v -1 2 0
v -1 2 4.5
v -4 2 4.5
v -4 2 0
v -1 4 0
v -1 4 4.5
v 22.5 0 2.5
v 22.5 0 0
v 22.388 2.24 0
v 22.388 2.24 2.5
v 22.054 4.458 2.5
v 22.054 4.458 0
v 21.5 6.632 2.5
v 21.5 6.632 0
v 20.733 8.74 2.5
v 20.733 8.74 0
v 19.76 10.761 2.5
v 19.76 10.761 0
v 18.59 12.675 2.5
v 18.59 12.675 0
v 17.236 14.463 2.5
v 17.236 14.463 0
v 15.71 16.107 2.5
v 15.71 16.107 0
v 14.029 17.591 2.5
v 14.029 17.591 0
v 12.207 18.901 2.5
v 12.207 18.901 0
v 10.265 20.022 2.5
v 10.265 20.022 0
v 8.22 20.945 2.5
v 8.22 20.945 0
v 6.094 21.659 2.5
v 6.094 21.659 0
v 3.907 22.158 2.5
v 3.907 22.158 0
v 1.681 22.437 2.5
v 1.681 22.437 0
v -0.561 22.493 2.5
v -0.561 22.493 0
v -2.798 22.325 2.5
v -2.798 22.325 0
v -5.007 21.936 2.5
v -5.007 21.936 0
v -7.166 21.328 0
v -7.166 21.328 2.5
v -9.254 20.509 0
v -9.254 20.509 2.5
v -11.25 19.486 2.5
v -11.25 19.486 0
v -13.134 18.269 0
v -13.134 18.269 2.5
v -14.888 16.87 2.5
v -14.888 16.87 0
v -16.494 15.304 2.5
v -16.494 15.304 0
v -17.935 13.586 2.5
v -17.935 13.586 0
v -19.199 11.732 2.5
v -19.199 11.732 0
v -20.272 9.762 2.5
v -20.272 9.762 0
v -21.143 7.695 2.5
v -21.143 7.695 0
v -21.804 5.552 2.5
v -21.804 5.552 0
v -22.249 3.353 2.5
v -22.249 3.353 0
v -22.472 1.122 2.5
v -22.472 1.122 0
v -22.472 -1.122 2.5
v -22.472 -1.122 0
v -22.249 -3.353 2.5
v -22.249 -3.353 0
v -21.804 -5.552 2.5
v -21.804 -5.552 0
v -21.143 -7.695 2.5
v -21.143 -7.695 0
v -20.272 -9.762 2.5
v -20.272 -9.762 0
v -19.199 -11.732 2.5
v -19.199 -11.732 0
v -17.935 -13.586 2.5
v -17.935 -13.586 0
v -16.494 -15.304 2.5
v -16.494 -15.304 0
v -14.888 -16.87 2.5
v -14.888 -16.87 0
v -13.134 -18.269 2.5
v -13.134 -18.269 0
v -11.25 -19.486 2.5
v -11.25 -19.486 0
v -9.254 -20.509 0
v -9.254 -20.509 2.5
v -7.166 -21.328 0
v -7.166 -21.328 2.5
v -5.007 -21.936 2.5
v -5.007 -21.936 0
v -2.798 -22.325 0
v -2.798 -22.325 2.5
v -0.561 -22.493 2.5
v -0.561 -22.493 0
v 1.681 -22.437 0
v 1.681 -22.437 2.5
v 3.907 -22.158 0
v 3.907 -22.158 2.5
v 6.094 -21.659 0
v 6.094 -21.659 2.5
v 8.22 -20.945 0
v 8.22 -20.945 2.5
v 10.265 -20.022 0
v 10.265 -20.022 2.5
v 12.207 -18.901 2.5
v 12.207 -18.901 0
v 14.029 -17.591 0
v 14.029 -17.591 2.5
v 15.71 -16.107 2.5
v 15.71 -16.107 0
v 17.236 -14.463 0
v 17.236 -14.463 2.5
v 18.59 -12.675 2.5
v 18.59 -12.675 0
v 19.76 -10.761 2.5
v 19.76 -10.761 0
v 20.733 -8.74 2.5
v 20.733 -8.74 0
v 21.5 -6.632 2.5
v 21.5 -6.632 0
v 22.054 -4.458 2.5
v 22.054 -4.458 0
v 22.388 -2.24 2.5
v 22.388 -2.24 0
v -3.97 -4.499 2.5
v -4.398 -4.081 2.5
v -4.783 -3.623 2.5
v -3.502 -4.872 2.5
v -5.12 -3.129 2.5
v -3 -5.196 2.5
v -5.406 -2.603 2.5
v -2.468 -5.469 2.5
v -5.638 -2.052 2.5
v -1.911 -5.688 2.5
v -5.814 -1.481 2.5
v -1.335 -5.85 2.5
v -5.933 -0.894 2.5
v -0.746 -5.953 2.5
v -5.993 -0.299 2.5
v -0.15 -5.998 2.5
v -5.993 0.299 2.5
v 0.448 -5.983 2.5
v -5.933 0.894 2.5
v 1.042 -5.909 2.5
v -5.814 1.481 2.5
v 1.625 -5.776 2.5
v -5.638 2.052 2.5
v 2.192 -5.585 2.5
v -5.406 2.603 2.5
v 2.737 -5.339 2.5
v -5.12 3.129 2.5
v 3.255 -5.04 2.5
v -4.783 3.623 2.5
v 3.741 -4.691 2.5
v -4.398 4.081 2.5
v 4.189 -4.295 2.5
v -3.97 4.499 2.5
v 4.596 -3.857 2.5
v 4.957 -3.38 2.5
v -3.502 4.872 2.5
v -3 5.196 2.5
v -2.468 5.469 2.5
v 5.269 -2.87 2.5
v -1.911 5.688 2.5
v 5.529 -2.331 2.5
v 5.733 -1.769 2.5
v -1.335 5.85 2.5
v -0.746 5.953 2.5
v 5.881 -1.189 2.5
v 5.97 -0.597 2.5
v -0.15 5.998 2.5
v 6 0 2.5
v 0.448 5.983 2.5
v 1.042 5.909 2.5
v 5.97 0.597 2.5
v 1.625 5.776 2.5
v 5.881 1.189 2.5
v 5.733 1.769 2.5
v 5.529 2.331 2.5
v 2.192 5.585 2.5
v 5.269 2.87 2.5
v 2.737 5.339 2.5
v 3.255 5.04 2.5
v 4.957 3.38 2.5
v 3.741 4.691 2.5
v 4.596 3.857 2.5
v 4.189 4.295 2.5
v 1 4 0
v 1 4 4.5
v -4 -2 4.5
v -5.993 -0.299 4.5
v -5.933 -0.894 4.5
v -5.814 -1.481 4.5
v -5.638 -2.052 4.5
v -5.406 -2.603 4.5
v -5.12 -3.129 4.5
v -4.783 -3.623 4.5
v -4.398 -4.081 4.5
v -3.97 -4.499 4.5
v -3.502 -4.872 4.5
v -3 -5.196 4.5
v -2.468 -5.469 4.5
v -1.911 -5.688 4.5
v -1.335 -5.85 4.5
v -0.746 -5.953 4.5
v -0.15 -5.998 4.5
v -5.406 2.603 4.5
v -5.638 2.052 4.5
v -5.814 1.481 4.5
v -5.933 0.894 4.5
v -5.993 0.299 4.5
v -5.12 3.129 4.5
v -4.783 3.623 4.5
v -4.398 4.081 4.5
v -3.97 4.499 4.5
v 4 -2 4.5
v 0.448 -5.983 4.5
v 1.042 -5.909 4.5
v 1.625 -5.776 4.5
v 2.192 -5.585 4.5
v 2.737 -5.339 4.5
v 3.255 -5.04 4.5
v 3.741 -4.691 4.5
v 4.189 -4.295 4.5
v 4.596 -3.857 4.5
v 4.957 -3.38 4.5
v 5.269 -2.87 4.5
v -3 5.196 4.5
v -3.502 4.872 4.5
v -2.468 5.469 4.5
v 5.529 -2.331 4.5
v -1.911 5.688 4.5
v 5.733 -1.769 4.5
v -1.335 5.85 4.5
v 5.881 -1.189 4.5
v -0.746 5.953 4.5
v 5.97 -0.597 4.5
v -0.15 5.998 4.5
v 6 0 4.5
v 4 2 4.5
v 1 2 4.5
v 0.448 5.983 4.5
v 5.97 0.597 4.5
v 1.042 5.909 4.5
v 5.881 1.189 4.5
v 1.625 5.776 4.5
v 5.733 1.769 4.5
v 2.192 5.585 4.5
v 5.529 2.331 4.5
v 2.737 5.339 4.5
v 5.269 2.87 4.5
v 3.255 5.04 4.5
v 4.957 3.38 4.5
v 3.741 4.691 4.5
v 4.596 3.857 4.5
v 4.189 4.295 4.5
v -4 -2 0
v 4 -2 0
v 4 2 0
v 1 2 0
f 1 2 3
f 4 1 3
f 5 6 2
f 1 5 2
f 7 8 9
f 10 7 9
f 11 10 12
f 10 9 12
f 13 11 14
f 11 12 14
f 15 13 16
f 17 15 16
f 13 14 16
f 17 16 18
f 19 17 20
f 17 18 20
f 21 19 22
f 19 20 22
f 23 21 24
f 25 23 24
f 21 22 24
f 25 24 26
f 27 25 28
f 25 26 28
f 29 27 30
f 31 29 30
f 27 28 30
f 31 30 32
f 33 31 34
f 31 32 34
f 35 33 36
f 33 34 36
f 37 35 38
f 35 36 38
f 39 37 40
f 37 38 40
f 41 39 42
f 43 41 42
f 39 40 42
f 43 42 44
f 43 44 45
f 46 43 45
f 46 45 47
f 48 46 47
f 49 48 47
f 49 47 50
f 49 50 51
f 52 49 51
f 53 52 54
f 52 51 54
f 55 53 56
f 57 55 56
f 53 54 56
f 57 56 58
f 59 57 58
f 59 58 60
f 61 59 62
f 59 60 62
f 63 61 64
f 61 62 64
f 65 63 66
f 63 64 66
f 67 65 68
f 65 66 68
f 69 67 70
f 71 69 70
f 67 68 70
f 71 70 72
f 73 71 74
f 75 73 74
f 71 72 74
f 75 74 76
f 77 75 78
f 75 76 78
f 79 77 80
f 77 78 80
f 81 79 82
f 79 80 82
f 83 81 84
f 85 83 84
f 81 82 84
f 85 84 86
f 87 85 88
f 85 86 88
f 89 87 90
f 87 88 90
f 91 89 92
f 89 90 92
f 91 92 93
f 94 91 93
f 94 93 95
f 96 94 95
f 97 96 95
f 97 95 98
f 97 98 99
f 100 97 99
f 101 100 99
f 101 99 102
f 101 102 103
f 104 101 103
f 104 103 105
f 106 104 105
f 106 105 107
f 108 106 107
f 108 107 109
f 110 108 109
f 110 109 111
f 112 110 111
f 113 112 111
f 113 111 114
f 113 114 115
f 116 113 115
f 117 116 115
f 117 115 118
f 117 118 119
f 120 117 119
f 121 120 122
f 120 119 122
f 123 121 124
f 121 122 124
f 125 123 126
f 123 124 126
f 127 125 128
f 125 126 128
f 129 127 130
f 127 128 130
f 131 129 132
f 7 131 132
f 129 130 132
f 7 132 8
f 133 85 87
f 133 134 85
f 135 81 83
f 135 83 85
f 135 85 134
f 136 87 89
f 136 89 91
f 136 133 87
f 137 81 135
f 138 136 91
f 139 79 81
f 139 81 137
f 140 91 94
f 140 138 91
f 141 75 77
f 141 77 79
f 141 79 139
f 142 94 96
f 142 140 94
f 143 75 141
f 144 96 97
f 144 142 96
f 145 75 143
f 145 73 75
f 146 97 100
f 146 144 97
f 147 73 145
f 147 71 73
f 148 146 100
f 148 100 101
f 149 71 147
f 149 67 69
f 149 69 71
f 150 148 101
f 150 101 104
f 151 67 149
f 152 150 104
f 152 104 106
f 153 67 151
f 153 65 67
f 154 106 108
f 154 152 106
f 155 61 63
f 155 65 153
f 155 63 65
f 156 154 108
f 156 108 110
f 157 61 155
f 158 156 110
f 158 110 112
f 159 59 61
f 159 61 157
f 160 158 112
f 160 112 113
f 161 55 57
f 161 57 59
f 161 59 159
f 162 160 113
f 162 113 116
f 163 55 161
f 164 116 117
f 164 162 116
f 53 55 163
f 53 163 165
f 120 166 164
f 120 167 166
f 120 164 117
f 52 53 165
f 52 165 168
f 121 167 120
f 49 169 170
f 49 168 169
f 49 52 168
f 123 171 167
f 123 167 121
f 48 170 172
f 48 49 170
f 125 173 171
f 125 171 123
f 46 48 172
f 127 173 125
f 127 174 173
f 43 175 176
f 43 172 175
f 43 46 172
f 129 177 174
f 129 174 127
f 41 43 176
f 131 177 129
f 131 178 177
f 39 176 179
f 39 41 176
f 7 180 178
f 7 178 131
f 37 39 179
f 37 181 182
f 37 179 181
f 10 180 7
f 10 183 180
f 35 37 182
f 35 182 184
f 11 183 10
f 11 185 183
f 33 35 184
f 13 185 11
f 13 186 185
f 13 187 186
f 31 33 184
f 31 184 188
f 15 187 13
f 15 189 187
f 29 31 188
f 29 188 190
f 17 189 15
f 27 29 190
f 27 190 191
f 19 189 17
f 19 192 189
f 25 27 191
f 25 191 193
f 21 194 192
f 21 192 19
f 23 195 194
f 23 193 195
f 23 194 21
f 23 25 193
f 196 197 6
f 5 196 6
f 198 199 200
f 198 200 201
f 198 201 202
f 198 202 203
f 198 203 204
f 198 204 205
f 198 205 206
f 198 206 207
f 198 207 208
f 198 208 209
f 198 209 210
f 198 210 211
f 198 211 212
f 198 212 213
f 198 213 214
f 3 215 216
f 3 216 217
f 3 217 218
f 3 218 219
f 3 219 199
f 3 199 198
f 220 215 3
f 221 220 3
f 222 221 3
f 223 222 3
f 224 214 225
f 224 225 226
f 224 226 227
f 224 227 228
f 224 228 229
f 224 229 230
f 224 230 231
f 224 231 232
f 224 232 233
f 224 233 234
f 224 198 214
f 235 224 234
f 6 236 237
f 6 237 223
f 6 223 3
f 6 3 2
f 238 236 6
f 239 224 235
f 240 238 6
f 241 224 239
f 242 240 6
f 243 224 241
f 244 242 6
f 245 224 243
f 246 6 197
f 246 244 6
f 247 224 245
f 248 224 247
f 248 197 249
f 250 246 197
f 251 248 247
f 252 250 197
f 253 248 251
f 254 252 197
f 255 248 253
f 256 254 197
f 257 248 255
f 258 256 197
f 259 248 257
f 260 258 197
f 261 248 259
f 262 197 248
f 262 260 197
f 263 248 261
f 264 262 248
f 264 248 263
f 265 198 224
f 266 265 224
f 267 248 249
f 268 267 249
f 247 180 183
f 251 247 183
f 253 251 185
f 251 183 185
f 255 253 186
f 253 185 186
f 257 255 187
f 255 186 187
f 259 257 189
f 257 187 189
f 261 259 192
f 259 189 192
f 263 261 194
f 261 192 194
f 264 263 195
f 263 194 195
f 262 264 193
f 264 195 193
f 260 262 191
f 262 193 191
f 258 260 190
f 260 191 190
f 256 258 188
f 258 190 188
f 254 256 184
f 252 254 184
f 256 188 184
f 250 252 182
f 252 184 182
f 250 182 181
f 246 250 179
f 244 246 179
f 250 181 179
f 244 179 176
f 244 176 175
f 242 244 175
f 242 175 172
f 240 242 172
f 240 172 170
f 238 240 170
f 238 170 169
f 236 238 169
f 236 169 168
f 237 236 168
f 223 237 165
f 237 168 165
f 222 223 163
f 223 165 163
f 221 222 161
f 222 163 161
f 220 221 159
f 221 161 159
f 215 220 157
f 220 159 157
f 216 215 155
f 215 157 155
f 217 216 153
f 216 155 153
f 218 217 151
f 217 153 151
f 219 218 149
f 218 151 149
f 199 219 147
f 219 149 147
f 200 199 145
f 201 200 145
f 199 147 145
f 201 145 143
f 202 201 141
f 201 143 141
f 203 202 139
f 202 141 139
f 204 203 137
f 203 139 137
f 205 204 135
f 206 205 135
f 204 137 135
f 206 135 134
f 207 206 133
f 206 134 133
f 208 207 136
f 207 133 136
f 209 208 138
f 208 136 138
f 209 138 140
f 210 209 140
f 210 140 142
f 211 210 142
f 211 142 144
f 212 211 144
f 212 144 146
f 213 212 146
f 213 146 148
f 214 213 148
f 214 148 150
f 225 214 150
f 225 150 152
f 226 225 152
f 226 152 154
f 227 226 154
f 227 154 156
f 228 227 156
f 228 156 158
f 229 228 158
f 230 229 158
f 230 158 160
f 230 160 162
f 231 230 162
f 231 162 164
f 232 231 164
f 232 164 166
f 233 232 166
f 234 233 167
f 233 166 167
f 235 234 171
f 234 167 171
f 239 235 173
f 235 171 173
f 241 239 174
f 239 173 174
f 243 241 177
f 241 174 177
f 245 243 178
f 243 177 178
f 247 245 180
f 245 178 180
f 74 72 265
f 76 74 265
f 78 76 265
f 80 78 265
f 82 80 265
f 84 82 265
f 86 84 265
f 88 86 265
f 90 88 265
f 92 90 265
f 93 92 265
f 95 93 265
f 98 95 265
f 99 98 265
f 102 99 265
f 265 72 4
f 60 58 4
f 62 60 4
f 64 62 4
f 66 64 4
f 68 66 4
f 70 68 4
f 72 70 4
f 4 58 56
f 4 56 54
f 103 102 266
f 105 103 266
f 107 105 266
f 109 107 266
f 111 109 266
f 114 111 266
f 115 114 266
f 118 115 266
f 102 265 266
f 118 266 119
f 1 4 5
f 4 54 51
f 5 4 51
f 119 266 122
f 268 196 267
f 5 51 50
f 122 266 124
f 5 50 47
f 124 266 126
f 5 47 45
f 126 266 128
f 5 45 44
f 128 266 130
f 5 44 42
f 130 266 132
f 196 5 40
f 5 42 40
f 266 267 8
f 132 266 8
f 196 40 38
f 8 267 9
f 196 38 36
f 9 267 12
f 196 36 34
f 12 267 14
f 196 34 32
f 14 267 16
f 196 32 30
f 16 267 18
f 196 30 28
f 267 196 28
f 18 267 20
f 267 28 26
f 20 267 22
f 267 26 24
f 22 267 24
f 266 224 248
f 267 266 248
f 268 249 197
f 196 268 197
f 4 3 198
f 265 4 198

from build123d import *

# Parameters (mm, degrees)
SKETCH1_R           = 22.5
BOSS_EXTRUDE1_DEPTH = 2.5
SKETCH2_R           = 6
BOSS_EXTRUDE2_DEPTH = 2
CUT_EXTRUDE1_DEPTH  = 10


with BuildPart() as part:
    # Sketch1 → Boss-Extrude1 (new body)
    with BuildSketch(Plane.XY):
        Circle(SKETCH1_R)
    extrude(amount=BOSS_EXTRUDE1_DEPTH)

    # Sketch2 → Boss-Extrude2 (add)
    with BuildSketch(Plane.XY.offset(2.5)):
        Circle(SKETCH2_R)
    extrude(amount=BOSS_EXTRUDE2_DEPTH)

    # Sketch3 → Cut-Extrude1 (cut)
    with BuildSketch(Plane.XY.offset(4.5)):
        Polygon((-4, 2), (-4, -2), (4, -2), (4, 2), (1, 2), (1, 4), (-1, 4), (-1, 2), align=None)
    extrude(amount=-CUT_EXTRUDE1_DEPTH, mode=Mode.SUBTRACT)


solid = part.part
